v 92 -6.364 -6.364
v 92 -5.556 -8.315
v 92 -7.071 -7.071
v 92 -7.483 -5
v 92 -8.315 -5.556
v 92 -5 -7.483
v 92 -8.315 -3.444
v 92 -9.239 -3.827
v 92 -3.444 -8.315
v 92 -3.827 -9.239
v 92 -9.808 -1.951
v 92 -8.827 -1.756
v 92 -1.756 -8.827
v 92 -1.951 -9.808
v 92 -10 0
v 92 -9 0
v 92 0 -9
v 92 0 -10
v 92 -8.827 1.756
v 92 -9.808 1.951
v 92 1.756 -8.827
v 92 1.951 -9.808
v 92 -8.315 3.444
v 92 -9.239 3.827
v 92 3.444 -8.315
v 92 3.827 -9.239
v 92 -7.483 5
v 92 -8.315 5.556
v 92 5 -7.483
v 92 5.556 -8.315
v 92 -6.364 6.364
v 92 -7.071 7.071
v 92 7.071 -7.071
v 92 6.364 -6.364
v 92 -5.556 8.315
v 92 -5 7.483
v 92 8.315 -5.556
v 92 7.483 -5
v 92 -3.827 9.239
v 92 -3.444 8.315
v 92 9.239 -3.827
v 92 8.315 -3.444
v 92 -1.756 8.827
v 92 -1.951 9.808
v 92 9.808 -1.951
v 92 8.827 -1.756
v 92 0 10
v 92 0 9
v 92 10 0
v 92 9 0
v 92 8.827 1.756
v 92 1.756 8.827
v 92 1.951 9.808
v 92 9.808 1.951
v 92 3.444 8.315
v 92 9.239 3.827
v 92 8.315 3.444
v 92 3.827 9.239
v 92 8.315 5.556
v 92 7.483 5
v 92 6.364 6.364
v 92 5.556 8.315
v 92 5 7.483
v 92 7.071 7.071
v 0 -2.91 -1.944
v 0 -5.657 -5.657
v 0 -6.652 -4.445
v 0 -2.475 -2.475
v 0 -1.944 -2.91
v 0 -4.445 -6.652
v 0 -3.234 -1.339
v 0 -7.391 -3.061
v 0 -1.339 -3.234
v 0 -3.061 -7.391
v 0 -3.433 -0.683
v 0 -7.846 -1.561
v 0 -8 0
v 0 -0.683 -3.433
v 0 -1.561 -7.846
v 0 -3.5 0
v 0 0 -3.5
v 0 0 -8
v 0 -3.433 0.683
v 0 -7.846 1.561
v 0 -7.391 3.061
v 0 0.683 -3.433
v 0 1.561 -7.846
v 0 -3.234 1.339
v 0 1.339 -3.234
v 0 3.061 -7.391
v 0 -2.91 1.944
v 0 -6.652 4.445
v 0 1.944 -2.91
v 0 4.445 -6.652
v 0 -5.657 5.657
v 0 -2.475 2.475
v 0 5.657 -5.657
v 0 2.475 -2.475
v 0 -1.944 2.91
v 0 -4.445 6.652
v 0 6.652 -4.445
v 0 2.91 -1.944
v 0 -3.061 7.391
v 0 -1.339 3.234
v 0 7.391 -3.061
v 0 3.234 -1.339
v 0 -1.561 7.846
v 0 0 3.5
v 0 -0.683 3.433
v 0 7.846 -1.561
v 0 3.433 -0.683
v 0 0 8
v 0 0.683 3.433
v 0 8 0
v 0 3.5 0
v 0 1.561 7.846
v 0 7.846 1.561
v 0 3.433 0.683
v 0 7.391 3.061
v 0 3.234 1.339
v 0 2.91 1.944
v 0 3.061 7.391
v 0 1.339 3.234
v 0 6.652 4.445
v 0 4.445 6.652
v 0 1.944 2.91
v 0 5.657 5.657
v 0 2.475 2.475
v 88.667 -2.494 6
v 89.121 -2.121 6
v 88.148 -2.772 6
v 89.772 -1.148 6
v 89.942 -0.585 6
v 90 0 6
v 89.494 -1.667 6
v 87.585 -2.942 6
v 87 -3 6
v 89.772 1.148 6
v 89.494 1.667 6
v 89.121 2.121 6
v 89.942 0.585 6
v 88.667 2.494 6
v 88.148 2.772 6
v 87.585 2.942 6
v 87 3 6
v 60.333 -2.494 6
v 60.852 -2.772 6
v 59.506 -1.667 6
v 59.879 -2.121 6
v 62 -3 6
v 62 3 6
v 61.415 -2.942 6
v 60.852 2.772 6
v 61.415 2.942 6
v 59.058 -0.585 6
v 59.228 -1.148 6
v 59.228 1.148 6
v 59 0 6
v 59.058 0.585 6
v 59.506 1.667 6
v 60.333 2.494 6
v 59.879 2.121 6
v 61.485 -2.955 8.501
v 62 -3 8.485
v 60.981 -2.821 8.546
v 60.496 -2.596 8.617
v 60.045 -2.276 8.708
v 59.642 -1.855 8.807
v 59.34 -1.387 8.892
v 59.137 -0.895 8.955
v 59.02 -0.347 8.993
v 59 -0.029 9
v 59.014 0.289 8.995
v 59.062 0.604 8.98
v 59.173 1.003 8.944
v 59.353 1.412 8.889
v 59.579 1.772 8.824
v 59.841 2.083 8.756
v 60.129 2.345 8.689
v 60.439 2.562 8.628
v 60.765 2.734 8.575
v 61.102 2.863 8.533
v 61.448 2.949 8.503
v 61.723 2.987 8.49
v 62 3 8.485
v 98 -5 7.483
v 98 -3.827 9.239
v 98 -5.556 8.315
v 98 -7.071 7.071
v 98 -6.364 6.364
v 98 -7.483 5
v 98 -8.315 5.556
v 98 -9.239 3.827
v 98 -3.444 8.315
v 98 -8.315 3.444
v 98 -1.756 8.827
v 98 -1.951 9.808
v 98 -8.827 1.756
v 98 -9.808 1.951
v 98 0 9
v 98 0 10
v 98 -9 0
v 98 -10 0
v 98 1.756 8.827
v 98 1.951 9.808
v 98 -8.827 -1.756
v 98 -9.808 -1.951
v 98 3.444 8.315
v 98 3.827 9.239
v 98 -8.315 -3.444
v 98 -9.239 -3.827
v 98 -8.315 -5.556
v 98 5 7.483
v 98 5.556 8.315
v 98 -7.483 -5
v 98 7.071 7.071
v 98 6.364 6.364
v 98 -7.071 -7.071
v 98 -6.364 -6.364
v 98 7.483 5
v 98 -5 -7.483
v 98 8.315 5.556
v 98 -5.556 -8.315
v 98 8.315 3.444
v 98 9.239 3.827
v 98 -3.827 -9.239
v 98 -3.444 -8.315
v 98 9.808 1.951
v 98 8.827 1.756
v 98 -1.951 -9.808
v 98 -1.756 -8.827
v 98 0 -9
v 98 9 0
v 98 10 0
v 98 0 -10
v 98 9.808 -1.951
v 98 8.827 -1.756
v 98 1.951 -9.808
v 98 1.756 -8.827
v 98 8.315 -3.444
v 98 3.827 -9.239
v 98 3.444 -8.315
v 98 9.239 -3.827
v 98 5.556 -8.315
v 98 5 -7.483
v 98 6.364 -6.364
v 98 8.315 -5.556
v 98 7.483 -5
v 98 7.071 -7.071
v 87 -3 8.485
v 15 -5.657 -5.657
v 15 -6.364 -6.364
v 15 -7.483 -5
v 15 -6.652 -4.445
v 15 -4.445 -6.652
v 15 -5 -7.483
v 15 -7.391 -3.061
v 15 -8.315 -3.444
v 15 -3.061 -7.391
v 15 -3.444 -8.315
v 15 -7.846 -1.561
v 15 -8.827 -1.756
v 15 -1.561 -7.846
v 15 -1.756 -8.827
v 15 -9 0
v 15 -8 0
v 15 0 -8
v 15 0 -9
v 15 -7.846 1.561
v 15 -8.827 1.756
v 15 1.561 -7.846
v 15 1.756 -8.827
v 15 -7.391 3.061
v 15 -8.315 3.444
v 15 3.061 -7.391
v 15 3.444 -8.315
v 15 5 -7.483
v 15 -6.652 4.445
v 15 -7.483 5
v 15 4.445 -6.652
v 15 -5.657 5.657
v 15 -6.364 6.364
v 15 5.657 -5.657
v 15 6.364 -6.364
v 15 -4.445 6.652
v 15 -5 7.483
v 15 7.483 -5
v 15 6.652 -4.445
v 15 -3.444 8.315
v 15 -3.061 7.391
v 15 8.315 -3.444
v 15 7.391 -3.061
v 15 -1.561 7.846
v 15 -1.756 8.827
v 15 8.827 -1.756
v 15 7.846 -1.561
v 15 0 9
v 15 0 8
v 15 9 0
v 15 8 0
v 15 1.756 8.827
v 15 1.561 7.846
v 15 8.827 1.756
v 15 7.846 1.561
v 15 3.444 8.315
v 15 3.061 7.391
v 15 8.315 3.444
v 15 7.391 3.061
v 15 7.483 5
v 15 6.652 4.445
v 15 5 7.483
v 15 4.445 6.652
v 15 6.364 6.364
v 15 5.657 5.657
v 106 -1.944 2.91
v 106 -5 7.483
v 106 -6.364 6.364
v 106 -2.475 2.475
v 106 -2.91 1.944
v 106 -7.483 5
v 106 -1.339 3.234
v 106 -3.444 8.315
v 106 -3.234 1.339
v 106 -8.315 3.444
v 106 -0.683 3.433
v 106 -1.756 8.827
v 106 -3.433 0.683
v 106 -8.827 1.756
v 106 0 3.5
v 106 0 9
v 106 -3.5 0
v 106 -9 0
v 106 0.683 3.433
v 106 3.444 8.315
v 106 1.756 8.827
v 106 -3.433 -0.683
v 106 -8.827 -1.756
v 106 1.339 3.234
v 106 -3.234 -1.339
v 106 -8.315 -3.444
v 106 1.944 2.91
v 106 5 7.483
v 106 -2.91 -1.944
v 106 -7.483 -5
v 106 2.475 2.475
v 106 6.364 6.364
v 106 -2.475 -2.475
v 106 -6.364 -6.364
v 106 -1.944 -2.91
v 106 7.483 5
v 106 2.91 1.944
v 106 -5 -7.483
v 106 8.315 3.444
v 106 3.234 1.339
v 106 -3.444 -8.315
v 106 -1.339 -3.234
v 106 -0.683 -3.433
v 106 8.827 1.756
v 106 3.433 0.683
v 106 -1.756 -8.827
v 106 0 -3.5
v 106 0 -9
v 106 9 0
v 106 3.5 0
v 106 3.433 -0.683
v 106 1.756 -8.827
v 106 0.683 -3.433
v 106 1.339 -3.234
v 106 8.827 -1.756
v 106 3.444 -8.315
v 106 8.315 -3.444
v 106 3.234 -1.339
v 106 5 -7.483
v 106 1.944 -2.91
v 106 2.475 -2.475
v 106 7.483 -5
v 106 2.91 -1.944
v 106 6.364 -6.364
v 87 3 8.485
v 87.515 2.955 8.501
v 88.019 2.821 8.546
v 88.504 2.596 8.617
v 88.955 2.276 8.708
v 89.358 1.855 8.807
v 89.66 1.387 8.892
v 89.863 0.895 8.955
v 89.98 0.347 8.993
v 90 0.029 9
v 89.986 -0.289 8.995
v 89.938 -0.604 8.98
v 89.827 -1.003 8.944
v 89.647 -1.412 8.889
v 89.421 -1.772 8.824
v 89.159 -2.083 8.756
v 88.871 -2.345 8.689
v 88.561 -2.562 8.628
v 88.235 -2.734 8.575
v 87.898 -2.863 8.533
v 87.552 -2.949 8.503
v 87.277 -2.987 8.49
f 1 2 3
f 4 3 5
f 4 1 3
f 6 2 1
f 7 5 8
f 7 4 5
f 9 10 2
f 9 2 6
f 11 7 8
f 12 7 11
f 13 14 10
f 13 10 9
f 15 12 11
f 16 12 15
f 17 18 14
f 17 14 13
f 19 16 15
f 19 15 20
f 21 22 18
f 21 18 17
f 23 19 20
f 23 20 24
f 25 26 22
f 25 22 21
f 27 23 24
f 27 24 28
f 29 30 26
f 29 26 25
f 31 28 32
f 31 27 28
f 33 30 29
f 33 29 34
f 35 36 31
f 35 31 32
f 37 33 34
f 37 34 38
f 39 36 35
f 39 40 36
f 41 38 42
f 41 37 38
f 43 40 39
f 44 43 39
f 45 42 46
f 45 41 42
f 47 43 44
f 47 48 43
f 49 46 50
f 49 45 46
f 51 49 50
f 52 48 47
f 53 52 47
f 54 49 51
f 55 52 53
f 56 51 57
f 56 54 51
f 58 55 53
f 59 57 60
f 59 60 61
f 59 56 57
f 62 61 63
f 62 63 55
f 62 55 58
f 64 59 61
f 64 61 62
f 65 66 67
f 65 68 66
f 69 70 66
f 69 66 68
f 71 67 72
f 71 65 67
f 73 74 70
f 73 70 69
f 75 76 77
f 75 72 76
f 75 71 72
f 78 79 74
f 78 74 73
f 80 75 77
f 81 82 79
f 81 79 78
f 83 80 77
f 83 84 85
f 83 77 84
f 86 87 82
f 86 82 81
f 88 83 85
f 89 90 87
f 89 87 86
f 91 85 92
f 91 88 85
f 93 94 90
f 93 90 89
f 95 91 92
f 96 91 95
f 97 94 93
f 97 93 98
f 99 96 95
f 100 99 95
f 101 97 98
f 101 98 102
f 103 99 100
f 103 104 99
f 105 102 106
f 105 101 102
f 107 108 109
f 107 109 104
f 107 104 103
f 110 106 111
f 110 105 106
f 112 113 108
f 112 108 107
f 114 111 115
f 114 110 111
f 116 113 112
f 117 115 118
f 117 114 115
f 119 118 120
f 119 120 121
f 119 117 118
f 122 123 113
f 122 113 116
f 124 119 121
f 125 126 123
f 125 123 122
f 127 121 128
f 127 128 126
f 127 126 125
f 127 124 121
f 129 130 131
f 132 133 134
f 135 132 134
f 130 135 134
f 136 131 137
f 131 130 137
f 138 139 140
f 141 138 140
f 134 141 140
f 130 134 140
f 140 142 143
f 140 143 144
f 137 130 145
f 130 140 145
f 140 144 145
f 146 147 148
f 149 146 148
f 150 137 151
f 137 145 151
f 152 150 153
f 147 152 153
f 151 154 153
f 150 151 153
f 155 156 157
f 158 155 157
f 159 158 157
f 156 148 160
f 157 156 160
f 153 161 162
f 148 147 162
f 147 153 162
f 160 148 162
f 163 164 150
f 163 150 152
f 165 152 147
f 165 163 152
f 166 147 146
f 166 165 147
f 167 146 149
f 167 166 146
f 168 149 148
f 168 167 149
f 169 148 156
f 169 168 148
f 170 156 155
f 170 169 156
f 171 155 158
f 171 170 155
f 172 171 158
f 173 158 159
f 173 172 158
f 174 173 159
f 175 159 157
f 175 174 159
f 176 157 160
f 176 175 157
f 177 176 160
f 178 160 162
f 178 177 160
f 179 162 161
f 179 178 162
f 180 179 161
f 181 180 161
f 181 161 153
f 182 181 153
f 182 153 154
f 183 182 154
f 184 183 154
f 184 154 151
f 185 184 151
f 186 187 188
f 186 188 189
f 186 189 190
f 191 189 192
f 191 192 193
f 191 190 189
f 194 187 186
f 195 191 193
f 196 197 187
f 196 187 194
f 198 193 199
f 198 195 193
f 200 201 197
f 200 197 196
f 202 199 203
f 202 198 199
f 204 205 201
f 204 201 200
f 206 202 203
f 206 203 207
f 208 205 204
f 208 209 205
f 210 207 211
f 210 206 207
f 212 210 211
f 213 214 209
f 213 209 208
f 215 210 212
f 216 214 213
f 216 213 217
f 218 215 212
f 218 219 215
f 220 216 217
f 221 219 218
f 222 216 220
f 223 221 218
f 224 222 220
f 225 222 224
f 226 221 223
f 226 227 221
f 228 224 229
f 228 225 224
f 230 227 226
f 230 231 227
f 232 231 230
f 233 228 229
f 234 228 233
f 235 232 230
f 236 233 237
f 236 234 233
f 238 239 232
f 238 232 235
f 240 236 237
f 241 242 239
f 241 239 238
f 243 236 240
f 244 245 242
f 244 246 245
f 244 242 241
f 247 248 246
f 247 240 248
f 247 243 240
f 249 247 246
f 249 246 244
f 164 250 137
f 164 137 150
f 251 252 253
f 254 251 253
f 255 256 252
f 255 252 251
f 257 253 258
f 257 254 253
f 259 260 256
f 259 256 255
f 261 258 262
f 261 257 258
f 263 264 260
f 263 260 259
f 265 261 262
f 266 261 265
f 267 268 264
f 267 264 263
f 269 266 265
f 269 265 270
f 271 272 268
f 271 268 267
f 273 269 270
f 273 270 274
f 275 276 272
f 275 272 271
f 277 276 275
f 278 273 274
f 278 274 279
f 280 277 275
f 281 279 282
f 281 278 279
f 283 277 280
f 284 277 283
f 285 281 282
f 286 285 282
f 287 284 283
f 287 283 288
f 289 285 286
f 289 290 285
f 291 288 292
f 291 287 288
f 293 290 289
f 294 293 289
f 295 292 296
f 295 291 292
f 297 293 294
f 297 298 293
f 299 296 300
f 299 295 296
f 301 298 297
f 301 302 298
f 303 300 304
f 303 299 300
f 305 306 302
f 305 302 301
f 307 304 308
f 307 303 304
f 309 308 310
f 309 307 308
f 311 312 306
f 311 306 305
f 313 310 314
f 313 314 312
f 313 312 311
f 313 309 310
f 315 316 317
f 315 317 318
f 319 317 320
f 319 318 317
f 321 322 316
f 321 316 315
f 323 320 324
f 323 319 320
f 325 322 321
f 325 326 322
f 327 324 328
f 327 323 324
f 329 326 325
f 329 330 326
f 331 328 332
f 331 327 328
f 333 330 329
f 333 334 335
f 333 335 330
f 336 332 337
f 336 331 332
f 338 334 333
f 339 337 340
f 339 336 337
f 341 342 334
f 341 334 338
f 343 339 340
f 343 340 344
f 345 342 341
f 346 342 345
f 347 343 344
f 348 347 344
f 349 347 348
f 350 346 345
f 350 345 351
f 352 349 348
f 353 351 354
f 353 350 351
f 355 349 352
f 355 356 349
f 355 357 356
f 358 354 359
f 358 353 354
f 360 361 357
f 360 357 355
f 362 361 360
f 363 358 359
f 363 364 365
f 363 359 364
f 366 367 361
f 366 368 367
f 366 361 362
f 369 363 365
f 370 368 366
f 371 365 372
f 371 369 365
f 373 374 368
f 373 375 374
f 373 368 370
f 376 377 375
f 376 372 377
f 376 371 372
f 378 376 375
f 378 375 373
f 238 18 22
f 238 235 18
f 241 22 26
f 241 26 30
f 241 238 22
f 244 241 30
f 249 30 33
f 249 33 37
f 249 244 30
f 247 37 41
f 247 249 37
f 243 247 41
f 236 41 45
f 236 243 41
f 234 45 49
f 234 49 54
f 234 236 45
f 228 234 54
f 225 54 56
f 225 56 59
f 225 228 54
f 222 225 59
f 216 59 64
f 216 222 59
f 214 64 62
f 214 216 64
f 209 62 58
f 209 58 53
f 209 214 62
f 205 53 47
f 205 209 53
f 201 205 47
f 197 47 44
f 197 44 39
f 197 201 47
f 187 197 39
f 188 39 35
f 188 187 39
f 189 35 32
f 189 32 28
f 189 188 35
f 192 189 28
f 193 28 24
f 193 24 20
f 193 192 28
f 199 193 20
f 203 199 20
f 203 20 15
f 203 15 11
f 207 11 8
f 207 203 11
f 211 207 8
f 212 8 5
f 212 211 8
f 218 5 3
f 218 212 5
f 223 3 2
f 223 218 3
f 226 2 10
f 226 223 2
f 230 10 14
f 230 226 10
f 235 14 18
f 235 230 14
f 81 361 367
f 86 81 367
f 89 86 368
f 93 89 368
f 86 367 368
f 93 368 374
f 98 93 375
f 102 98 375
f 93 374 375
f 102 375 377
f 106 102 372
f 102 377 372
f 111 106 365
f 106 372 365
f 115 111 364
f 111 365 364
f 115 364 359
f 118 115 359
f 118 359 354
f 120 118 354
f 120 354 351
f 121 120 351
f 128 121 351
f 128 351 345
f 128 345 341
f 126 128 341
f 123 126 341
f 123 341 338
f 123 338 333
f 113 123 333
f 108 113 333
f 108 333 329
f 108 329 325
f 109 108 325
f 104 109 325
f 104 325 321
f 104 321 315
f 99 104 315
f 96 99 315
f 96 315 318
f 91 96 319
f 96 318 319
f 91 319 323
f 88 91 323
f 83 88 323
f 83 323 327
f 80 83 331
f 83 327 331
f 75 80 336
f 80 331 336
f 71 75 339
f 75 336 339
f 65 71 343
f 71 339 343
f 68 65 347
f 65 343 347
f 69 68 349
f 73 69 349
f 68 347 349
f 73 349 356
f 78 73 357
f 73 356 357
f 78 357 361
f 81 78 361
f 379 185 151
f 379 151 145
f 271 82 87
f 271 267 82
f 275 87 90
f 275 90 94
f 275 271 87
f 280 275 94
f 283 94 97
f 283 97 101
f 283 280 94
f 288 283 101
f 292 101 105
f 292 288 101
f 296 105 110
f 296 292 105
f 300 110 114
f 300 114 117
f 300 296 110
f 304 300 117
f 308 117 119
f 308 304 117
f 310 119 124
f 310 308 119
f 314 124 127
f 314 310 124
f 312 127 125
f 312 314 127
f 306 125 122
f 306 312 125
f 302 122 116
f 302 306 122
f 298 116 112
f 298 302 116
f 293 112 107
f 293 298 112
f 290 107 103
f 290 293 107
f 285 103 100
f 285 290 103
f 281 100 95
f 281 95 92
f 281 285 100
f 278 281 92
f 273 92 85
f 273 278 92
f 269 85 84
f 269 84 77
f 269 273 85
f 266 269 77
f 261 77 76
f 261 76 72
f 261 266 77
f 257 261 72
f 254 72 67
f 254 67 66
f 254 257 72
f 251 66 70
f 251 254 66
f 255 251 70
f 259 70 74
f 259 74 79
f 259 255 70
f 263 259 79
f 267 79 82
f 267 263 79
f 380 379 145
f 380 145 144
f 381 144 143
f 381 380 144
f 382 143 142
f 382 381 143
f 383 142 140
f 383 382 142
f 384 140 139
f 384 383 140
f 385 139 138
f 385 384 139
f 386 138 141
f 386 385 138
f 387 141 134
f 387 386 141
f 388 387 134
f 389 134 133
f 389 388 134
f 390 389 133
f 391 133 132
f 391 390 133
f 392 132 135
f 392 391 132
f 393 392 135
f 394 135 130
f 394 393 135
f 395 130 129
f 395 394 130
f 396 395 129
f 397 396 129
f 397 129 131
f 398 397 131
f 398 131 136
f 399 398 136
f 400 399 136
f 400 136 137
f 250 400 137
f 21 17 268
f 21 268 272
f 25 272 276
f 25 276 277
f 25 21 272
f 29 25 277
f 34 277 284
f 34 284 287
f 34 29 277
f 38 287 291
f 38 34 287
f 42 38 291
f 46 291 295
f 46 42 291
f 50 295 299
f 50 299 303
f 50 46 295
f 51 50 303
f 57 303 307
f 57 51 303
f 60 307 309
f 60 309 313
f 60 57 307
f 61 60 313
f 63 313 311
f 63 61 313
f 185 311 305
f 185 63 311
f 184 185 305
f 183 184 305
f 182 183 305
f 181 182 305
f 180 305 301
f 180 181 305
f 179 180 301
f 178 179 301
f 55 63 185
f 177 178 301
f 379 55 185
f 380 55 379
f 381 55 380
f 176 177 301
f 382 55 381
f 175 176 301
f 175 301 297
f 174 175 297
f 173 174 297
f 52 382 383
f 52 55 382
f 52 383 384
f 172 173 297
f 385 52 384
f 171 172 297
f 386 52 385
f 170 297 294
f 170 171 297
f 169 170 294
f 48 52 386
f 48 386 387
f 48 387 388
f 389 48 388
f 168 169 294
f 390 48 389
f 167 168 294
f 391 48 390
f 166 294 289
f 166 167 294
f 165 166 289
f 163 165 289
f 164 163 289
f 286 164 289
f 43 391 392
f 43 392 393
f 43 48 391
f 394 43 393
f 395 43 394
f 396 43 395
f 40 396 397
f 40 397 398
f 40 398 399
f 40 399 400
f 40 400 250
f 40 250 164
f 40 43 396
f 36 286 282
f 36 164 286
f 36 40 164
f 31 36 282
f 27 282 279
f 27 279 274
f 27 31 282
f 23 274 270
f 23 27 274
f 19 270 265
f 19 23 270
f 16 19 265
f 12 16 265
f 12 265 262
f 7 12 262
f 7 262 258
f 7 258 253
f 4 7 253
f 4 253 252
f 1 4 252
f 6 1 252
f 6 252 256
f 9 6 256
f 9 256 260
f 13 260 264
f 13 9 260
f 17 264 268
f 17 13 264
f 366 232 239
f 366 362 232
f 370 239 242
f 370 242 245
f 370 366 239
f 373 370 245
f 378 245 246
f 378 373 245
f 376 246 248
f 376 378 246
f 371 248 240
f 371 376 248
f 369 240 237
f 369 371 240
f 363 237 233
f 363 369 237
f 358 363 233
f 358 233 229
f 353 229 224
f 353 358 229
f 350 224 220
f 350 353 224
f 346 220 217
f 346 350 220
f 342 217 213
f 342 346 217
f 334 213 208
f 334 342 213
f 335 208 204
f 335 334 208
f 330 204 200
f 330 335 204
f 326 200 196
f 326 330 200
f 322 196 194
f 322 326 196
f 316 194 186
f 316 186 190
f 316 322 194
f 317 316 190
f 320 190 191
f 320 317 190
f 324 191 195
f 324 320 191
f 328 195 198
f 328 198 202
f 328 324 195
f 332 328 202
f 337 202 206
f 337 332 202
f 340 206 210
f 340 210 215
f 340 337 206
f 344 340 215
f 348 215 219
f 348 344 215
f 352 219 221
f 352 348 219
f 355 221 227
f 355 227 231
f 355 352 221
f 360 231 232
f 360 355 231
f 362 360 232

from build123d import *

# Parameters (mm, degrees)
CUT_EXTRUDE_2_DEPTH = 3
SKETCH_5_R          = 3.5
CUT_EXTRUDE_3_DEPTH = 107


with BuildPart() as part:
    # 草图2 → 旋转1 (revolve)
    with BuildSketch(Plane(origin=(0, 0, 0), x_dir=(1, 0, 0), z_dir=(0, 1, 0))):
        Polygon((0, 0), (0, 8), (15, 8), (15, 9), (92, 9), (92, 10), (98, 10), (98, 9), (106, 9), (106, 0), align=None)
    revolve(axis=Axis((0, 0, 0), (1, 0, 0)))

    # 草图4 → 切除-拉伸2 (cut)
    with BuildSketch(Plane.XY.offset(9)):
        with BuildLine():
            Line((62, 3), (87, 3))
            ThreePointArc((87, 3), (90, 0), (87, -3))
            Line((87, -3), (62, -3))
            ThreePointArc((62, -3), (59, 0), (62, 3))
        make_face()
    extrude(amount=-CUT_EXTRUDE_2_DEPTH, mode=Mode.SUBTRACT)

    # 草图5 → 切除-拉伸3 (cut, through all)
    with BuildSketch(Plane(origin=(106, 0, 0), x_dir=(0, 0, -1), z_dir=(1, 0, 0))):
        Circle(SKETCH_5_R)
    extrude(amount=-CUT_EXTRUDE_3_DEPTH, mode=Mode.SUBTRACT)


solid = part.part
